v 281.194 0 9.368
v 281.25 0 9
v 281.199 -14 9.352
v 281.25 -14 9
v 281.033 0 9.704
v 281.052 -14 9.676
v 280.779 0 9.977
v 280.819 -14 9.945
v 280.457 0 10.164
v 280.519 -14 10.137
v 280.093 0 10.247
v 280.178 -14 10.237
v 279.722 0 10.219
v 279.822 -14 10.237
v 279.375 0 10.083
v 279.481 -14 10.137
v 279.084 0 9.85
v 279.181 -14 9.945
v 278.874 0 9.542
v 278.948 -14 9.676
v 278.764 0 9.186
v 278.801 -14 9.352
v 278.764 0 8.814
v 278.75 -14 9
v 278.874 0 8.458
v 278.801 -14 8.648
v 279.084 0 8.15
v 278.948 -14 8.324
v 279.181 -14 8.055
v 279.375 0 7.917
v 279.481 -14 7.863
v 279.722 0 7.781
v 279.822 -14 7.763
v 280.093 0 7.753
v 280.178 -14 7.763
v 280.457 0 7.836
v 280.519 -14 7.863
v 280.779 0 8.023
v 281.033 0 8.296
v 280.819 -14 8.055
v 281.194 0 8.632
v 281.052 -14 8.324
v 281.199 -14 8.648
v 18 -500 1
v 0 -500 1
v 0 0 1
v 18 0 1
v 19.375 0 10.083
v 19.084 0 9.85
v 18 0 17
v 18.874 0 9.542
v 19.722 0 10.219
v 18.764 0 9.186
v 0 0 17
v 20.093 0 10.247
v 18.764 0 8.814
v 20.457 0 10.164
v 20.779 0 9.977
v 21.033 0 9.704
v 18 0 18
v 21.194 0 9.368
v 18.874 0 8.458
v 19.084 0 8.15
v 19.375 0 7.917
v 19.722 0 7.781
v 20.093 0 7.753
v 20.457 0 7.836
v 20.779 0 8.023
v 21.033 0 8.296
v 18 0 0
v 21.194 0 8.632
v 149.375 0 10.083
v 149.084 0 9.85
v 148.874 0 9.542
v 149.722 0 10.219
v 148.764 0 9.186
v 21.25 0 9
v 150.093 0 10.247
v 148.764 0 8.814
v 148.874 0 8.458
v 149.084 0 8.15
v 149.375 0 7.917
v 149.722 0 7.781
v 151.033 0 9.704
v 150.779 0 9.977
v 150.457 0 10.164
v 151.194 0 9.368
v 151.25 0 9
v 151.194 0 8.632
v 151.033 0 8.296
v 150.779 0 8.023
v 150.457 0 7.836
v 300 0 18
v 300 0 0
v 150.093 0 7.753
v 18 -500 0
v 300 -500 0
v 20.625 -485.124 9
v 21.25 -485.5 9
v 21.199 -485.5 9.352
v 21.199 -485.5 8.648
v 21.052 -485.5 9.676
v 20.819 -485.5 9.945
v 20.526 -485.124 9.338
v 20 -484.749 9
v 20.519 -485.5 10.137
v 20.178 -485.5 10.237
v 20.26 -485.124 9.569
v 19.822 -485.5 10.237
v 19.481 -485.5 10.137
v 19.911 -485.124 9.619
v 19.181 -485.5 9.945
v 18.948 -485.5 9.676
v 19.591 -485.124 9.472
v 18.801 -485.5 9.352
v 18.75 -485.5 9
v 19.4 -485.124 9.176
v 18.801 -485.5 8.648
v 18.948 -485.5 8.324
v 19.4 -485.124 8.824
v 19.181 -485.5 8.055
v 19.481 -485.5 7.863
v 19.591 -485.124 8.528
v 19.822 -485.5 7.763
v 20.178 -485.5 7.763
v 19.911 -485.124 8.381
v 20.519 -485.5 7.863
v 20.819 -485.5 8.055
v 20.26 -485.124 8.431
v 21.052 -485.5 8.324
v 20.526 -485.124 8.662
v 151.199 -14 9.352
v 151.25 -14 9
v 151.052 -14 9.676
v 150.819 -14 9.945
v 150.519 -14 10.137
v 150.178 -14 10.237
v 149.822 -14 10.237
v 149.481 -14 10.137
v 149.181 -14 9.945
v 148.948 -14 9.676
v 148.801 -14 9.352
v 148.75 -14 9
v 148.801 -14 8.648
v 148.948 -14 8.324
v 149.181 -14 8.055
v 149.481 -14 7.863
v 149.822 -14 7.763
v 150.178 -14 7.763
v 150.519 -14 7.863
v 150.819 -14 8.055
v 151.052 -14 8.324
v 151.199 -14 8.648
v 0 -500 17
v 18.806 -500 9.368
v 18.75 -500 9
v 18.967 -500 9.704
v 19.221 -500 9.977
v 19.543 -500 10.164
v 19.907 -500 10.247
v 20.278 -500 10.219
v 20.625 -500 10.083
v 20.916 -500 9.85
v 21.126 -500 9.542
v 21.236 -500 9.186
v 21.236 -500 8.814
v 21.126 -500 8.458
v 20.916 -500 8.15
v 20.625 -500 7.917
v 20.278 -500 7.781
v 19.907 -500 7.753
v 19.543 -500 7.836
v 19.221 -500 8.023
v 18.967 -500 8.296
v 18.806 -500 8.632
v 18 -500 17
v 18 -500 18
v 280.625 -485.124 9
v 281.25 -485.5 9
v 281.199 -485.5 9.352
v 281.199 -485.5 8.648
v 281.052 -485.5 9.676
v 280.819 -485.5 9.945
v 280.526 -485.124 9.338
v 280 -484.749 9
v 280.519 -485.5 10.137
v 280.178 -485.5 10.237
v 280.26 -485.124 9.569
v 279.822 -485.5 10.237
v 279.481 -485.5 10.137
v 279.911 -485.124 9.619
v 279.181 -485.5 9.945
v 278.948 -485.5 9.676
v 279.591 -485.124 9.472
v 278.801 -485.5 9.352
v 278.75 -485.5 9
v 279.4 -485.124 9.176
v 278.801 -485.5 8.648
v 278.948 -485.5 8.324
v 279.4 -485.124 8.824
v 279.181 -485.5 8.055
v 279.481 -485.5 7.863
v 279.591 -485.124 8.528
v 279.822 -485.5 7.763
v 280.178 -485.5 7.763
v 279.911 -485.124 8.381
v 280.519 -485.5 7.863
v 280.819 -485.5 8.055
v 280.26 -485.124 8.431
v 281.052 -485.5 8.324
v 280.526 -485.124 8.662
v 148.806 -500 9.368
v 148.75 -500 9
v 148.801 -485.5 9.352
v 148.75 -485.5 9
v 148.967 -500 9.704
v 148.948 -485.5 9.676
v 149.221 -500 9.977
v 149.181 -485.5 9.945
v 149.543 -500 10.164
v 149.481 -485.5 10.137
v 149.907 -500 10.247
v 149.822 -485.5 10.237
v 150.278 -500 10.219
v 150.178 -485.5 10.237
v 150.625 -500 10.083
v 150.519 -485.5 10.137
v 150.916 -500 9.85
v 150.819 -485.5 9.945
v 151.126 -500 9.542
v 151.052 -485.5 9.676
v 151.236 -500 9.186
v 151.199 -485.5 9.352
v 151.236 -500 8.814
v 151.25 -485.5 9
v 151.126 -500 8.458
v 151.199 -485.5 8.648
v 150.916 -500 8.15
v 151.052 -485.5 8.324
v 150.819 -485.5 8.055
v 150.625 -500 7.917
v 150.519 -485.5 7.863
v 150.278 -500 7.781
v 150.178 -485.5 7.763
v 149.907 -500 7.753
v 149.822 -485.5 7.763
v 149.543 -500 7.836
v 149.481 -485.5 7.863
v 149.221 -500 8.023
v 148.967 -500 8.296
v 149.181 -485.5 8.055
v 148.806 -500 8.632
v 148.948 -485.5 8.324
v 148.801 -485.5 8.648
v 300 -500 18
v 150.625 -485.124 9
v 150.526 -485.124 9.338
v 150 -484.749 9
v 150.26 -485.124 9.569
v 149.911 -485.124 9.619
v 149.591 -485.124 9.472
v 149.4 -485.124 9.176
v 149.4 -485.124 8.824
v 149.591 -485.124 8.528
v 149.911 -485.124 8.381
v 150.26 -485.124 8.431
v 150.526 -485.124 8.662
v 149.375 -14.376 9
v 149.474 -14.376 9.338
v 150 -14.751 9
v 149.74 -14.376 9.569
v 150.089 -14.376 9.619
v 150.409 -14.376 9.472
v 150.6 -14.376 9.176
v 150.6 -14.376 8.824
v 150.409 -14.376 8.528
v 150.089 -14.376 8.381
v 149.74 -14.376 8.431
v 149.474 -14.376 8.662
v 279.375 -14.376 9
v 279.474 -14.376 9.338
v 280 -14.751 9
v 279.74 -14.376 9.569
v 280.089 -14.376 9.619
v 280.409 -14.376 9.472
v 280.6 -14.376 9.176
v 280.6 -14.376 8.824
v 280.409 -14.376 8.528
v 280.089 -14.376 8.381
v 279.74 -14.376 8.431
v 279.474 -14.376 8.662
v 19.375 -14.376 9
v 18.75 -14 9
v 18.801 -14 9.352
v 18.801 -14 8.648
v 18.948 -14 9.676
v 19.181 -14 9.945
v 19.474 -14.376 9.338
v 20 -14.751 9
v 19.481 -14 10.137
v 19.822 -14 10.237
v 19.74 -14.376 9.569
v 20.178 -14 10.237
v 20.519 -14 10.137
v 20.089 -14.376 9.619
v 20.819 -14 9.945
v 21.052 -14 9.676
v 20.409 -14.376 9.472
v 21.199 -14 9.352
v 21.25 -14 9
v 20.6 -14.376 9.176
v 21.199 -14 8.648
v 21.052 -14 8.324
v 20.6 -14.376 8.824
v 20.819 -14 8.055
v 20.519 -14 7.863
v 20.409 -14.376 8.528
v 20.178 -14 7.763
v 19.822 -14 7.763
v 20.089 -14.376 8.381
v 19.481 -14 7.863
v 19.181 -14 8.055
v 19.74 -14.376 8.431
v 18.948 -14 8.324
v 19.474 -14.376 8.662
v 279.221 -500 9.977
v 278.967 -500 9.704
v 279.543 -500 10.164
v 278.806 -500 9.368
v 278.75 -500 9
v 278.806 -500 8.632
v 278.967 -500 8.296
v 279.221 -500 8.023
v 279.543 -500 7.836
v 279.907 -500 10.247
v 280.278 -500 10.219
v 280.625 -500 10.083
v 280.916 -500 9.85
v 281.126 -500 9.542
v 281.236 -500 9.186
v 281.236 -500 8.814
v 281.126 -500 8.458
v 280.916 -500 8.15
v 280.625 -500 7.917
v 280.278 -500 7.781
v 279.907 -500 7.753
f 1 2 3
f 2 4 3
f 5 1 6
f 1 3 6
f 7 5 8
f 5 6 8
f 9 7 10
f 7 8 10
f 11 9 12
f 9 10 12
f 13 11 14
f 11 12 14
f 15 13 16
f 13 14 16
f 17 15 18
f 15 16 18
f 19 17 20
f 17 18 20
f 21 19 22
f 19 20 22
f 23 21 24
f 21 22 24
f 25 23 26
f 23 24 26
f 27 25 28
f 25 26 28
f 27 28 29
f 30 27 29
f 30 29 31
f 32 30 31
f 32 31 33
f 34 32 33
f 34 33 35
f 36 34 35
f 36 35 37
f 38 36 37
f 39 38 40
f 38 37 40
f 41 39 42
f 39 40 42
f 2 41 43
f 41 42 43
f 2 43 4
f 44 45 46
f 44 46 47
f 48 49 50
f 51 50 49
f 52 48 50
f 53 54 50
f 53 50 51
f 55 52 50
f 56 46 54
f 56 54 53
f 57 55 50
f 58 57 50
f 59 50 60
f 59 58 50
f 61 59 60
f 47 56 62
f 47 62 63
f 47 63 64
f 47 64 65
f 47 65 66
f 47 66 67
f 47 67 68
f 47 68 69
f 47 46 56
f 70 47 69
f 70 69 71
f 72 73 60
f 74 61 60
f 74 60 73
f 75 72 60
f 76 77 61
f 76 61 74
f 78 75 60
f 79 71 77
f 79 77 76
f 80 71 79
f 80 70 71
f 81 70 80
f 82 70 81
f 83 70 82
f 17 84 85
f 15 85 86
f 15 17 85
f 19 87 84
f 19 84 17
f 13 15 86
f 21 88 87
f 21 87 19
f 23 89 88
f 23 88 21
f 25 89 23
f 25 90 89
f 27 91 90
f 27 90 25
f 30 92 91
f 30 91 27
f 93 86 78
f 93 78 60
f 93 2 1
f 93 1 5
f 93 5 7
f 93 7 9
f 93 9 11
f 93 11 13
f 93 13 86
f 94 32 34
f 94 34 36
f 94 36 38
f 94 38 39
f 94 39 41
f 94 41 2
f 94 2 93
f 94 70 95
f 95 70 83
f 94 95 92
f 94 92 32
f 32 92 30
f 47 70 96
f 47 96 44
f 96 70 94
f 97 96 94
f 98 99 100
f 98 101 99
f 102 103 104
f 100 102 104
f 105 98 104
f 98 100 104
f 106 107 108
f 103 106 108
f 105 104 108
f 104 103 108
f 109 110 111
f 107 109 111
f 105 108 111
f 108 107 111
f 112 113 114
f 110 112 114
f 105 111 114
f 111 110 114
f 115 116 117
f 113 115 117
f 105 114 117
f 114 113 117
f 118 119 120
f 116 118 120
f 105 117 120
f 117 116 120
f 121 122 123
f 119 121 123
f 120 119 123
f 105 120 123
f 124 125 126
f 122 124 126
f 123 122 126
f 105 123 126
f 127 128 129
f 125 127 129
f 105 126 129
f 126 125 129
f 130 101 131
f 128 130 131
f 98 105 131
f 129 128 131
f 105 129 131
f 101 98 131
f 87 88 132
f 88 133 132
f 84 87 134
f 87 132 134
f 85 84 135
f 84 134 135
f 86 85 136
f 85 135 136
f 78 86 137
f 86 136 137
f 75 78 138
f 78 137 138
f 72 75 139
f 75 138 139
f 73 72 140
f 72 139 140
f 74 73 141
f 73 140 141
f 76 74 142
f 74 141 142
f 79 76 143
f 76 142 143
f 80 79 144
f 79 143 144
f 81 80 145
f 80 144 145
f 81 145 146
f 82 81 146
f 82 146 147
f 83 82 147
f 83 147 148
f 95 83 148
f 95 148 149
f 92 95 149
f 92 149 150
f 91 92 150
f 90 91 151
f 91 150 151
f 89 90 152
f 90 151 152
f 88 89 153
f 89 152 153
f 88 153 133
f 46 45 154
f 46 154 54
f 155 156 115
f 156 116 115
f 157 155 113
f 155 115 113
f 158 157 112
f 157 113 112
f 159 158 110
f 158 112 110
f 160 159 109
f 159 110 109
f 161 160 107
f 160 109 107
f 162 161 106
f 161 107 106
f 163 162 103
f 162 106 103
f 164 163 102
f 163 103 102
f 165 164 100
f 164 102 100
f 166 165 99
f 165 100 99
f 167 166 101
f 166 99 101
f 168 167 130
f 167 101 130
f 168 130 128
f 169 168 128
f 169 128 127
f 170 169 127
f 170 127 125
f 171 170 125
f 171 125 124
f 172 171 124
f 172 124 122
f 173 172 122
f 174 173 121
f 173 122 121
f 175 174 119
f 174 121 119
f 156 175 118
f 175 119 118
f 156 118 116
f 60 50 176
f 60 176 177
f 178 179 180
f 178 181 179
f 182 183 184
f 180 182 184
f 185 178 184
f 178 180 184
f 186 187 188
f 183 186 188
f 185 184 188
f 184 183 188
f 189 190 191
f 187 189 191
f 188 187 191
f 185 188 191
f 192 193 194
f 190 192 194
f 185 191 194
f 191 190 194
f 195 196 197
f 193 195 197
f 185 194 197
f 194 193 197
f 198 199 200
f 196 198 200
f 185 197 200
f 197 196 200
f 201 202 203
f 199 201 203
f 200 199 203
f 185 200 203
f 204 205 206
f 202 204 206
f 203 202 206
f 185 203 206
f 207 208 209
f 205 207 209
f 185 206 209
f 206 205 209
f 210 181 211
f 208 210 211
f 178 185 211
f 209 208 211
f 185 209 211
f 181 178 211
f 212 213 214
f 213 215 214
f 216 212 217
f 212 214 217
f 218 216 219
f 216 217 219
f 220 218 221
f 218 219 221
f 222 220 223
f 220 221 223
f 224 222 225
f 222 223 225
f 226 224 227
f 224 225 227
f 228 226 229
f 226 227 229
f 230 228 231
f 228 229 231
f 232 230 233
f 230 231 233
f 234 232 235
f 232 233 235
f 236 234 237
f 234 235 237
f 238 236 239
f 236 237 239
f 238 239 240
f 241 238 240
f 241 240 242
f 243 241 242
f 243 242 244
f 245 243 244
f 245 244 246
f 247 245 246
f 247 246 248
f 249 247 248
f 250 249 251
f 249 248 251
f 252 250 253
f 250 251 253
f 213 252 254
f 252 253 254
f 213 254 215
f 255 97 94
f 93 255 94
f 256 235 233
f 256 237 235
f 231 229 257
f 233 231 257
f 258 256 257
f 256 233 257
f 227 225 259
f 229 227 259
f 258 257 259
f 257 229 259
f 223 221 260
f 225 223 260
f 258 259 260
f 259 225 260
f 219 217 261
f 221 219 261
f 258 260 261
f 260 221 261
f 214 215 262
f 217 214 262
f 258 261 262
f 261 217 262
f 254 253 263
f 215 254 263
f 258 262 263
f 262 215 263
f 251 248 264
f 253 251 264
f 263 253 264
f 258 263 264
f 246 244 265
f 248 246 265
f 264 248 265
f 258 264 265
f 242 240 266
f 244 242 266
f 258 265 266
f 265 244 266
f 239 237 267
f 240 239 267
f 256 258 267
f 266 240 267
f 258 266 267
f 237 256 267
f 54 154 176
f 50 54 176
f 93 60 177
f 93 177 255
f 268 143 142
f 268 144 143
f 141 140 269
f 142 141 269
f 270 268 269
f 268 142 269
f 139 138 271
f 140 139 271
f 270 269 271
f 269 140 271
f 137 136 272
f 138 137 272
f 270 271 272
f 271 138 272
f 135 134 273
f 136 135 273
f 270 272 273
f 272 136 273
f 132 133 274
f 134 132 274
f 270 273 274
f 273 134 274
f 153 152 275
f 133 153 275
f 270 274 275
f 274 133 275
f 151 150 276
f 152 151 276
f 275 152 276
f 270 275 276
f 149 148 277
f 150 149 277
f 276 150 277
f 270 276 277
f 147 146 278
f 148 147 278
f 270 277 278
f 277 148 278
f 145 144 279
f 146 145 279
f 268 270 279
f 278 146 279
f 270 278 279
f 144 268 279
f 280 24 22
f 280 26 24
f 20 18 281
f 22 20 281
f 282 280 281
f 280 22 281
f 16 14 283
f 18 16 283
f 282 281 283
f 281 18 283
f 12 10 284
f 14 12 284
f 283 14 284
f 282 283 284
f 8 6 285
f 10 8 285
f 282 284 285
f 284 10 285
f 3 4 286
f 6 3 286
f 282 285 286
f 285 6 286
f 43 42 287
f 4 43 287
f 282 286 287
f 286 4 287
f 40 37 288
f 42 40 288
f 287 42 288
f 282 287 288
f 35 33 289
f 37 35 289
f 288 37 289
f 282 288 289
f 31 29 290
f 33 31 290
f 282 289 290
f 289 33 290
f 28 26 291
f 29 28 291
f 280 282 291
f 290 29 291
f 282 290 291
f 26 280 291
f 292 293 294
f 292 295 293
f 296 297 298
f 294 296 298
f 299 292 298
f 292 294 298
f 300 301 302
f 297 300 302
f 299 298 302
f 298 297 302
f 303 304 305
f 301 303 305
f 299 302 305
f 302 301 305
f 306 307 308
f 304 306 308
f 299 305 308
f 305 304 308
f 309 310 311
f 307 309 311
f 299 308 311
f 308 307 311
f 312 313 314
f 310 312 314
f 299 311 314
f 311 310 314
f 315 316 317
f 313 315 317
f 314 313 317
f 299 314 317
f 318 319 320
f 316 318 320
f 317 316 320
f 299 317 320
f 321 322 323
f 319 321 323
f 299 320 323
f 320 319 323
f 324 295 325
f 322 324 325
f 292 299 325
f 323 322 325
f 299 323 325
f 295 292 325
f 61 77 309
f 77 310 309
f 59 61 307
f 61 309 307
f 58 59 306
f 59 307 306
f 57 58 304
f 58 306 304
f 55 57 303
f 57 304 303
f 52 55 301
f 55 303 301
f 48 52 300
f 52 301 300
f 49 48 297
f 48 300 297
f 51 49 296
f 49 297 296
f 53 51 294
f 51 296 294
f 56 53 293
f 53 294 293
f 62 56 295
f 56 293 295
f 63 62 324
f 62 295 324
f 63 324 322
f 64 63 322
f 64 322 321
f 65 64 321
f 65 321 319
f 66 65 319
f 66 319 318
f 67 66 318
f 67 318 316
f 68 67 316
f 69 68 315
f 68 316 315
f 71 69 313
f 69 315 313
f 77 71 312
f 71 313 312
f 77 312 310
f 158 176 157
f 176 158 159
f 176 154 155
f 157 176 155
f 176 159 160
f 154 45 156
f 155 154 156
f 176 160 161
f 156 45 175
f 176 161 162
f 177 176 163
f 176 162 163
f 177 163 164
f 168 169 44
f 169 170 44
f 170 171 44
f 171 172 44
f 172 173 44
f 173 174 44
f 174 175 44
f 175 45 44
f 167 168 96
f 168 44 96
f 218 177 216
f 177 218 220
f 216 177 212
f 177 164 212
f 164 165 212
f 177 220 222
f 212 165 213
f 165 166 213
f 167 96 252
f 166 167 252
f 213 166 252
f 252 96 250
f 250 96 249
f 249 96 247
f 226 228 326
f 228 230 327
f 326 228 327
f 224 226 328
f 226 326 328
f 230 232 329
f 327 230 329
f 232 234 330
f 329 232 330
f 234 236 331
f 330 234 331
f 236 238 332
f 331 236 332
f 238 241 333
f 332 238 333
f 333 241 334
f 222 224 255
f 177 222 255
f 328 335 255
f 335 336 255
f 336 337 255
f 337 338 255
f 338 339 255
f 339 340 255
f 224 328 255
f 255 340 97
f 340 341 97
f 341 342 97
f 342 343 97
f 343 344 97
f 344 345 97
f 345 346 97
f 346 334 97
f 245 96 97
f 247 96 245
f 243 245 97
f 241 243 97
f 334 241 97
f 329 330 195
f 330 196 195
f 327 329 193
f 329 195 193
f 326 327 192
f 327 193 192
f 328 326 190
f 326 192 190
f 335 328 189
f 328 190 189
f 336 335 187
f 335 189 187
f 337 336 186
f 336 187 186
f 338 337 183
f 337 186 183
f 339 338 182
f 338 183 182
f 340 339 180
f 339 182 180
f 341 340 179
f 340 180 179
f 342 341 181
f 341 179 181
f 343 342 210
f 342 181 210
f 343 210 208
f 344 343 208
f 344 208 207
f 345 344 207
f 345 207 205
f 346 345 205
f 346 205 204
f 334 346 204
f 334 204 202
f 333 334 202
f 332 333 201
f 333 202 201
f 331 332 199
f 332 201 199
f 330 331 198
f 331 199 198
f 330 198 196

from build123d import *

# Parameters (mm, degrees)
F0_W     = 300
F0_H     = 500
F1_DEPTH = 18
F3_D     = 2.5
F3_DEPTH = 14.5
F3_TIP   = 0.7510757738
F5_D     = 2.5
F5_DEPTH = 14
F5_TIP   = 0.7510757738
F6_W     = 18
F6_H     = 1
F7_DEPTH = 500.001


with BuildPart() as f1:
    # F0 (on Top) → F1 (new body)
    with BuildSketch(Plane.XY):
        with Locations((150, -250)):
            Rectangle(F0_W, F0_H)
    extrude(amount=F1_DEPTH)

    # F3
    with Locations(Plane.XZ.offset(500)):
        with Locations((20, 9), (150, 9), (280, 9)):
            Hole(F3_D / 2, depth=F3_DEPTH)
            with Locations((0, 0, -(F3_DEPTH + F3_TIP / 2))):  # 118° drill point
                Cone(0, F3_D / 2, F3_TIP, mode=Mode.SUBTRACT)

    # F5
    with Locations(Plane(origin=(0, 0, 0), x_dir=(-1, 0, 0), z_dir=(0, 1, 0))):
        with Locations((-280, 9), (-150, 9), (-20, 9)):
            Hole(F5_D / 2, depth=F5_DEPTH)
            with Locations((0, 0, -(F5_DEPTH + F5_TIP / 2))):  # 118° drill point
                Cone(0, F5_D / 2, F5_TIP, mode=Mode.SUBTRACT)

    # F6 (on face) → F7 (cut, through all)
    with BuildSketch(Plane.XZ.offset(500)):
        with Locations((9, 17.5)):
            Rectangle(F6_W, F6_H)
        with Locations((9, 0.5)):
            Rectangle(F6_W, F6_H)
    extrude(amount=-F7_DEPTH, mode=Mode.SUBTRACT)


solid = f1.part
